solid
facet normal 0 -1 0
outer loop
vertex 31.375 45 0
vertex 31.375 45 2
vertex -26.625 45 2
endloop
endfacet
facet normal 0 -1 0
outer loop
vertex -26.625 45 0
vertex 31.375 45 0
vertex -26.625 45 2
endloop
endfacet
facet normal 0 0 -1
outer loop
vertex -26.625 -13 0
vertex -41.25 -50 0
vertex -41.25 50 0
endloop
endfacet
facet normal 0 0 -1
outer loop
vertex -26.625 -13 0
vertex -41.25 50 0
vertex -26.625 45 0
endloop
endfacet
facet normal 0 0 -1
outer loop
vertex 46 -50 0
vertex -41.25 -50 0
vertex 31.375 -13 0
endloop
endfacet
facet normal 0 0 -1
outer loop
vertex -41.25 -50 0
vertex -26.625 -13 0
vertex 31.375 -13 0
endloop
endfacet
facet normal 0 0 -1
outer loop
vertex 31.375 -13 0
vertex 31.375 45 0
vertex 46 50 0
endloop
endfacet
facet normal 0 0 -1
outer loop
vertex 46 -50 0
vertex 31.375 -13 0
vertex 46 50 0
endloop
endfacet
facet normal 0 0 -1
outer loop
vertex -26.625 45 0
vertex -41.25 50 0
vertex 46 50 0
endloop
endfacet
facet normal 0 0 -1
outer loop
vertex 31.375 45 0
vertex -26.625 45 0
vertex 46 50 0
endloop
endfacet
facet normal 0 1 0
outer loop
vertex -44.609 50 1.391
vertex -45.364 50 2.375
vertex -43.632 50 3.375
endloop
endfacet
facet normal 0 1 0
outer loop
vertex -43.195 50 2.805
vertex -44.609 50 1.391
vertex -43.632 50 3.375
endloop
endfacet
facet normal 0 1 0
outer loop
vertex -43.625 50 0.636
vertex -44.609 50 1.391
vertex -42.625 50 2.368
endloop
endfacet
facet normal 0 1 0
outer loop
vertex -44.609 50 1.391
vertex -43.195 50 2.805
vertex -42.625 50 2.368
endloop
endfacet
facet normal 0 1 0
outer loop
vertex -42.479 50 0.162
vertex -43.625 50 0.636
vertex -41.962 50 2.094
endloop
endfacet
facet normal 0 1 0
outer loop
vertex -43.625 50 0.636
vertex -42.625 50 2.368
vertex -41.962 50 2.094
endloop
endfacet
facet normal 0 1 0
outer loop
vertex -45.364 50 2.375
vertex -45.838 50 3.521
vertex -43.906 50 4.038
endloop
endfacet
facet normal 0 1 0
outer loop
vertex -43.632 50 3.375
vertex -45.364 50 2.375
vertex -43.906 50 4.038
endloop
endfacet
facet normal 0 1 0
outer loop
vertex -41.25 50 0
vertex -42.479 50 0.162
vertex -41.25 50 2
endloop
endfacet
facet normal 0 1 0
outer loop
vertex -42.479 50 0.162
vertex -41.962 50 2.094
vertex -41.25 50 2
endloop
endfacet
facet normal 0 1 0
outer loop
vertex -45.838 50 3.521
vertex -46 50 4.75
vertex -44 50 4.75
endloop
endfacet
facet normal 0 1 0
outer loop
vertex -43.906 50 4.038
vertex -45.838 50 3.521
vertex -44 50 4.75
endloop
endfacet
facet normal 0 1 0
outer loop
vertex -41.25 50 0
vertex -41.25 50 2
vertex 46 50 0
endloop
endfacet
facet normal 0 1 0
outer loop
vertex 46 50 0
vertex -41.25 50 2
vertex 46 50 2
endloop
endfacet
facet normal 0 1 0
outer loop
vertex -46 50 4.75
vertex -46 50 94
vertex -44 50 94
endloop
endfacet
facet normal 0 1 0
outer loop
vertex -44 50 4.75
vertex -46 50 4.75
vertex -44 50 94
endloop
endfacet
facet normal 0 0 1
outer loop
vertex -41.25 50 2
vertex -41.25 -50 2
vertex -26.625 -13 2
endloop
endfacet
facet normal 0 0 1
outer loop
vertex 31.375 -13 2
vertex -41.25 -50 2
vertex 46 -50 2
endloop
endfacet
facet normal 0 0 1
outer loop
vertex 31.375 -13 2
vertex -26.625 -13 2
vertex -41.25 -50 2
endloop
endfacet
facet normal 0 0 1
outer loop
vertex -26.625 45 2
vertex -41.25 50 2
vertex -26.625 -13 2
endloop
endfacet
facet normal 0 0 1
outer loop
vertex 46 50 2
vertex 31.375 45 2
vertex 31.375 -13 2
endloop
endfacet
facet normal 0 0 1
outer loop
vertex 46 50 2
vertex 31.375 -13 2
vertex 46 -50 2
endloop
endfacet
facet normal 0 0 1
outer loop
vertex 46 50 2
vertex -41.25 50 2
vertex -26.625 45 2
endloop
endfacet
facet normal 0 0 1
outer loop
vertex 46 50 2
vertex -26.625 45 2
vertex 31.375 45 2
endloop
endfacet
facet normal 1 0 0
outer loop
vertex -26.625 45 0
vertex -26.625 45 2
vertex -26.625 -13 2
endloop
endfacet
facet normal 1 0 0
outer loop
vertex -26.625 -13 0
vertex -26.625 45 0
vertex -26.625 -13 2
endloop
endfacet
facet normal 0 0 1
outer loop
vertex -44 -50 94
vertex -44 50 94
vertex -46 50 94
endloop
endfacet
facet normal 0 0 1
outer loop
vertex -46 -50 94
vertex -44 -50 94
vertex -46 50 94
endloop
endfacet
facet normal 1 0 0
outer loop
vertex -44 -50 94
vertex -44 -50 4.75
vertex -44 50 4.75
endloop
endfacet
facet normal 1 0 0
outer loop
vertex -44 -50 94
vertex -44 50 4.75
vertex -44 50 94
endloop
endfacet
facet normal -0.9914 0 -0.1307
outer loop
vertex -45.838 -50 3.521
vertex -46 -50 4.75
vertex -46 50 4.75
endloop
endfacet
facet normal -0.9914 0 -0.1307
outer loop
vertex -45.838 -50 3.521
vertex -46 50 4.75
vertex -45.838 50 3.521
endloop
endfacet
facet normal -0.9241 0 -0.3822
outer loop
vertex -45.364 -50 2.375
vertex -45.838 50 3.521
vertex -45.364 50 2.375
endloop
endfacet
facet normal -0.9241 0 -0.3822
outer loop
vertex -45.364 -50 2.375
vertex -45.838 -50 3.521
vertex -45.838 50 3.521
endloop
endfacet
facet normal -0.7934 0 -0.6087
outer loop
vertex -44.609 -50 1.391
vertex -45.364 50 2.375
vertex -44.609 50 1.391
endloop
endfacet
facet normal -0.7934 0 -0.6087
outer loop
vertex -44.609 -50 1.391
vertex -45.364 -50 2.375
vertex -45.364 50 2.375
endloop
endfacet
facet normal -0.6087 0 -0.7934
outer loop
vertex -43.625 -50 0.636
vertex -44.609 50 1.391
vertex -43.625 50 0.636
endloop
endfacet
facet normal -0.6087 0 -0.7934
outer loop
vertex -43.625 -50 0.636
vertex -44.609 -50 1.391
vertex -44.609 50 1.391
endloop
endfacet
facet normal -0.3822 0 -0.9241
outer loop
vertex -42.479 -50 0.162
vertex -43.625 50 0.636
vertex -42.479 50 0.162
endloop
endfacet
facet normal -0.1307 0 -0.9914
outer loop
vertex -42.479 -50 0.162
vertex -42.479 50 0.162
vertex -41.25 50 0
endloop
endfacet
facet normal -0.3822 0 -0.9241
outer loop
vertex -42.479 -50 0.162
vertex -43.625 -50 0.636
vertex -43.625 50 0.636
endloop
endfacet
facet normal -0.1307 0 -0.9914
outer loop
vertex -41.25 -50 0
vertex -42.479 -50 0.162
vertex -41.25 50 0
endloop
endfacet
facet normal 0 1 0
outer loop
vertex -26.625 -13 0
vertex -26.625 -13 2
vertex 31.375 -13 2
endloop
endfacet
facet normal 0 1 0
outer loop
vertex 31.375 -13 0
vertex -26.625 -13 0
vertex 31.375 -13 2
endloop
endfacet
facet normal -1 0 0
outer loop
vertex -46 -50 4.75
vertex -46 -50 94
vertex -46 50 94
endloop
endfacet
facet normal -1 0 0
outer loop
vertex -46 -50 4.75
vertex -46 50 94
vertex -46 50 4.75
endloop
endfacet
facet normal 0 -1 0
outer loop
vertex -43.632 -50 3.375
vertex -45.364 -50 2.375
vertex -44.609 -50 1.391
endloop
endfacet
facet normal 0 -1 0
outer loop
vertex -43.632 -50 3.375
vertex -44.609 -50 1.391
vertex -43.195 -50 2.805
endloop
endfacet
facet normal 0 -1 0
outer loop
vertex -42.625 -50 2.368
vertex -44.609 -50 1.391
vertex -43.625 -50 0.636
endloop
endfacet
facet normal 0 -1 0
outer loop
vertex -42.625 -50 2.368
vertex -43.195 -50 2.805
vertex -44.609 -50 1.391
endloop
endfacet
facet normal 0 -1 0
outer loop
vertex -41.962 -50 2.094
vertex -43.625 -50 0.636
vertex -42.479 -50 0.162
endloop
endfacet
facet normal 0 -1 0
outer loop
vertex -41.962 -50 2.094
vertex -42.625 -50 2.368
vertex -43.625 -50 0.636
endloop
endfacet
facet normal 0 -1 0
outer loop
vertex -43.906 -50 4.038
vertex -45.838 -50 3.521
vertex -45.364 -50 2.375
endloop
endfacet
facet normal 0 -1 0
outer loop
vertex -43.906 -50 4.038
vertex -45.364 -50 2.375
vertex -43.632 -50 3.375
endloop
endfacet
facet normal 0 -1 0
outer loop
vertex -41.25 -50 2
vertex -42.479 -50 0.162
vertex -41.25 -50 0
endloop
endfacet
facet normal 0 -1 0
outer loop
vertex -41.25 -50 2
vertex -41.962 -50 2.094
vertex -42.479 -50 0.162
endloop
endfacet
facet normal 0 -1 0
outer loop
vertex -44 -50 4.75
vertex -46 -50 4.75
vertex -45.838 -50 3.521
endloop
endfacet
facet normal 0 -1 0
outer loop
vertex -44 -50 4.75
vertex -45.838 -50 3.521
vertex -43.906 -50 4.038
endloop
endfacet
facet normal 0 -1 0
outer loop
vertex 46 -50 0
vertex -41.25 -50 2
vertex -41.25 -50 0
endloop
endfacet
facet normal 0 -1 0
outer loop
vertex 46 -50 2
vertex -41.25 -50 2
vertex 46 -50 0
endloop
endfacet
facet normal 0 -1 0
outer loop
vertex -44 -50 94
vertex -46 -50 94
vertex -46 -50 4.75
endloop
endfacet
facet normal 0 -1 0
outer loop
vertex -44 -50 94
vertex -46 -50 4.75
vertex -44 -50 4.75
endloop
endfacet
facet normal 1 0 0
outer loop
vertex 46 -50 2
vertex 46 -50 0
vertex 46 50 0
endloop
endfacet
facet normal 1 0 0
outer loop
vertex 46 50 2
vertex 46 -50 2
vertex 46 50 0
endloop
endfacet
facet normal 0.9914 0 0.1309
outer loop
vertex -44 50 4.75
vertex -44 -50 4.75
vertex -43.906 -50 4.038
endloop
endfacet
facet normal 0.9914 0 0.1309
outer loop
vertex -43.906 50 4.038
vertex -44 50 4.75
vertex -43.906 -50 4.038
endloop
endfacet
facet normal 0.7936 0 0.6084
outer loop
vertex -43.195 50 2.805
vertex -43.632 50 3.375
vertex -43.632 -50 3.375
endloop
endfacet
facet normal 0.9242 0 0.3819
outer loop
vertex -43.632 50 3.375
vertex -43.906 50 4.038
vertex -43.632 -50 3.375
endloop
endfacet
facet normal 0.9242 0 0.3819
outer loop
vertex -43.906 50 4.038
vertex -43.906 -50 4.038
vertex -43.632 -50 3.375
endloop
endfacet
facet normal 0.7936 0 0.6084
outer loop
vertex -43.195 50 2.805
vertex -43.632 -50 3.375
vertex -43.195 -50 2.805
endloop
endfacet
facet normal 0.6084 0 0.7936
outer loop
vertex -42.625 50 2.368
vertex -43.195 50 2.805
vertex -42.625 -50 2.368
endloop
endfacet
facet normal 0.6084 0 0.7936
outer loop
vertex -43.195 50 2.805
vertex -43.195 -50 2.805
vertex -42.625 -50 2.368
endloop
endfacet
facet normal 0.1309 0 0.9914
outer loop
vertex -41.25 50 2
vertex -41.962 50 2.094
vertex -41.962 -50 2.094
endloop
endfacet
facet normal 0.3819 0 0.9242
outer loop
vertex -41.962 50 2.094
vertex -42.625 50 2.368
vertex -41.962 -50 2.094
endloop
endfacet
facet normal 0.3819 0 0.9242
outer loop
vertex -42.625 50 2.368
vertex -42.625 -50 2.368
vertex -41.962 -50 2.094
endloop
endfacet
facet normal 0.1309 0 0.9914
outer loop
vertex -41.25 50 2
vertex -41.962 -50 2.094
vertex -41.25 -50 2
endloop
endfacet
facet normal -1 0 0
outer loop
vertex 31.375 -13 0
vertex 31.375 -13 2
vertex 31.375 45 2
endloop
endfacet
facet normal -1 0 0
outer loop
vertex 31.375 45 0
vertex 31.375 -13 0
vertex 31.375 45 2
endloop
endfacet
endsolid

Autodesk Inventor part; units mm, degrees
ref_plane "YZ Plane" through (0, 0, 0) normal (1, 0, 0) x (0, 1, 0)
ref_plane "XZ Plane" through (0, 0, 0) normal (0, 1, 0) x (-1, 0, 0)
ref_plane "XY Plane" through (0, 0, 0) normal (0, 0, 1) x (1, 0, 0)
sketch "Sketch1" plane through (0, 0, 0) normal (0, 0, 1) x (1, 0, 0)
  line L0 (-46, -50) -> (46, -50)
  line L1 (46, -50) -> (46, 50)
  line L2 (46, 50) -> (-46, 50)
  line L3 (-46, 50) -> (-46, -50)
  line L4 (-46, -50) -> (46, 50) construction
  line L5 (46, -50) -> (-46, 50) construction
  point P0 (0, 0)
  dimension "d154" = 92
  dimension "d155" = 100
extrude "Plate5" add sketch "Sketch1" along normal blind 2
sketch "Sketch7" plane through (-44, -50, 0) normal (-1, 0, 0) x (0, -1, 0)
  line L0 (-100, 0) -> (0, 0)
  line L1 (0, 0) -> (0, 94)
  line L2 (0, 94) -> (-100, 94)
  line L3 (-100, 94) -> (-100, 0)
edge flange "Flange3" height 94 angle 90 thickness 2 bend radius 2.75 thickness toward (-1, 0, 0) relief round relief width 2 relief depth 1 edges at (-46, 0, 2) wall of the first edge with corners at (-44, 50, 0) (-44, -50, 0) (-44, -50, 94) (-44, 50, 94)
bend "Bend3"
corner "Corner3"
sketch "Sketch8" plane through (0, 0, 2) normal (0, 0, 1) x (1, 0, 0)
  line L0 (46, 50) -> (46, -50) projected
  line L1 (-41.25, 50) -> (46, 50) projected
  line L2 (31.375, 45) -> (-26.625, 45)
  line L3 (-26.625, 45) -> (-26.625, -13)
  line L4 (-26.625, -13) -> (31.375, -13)
  line L5 (31.375, -13) -> (31.375, 45)
  line L6 (31.375, 45) -> (-26.625, -13) construction
  line L7 (-26.625, 45) -> (31.375, -13) construction
  point P0 (0, 0)
  point P1 (2.375, 16)
  point P2 (2.375, 50)
  dimension "d167" = 58
  dimension "d168" = 58
  dimension "d169" = 5
extrude "Cut1" cut sketch "Sketch8" against normal blind 2
properties part number "TZS 1652 FDS Central tube wall" material "Stainless Steel"
